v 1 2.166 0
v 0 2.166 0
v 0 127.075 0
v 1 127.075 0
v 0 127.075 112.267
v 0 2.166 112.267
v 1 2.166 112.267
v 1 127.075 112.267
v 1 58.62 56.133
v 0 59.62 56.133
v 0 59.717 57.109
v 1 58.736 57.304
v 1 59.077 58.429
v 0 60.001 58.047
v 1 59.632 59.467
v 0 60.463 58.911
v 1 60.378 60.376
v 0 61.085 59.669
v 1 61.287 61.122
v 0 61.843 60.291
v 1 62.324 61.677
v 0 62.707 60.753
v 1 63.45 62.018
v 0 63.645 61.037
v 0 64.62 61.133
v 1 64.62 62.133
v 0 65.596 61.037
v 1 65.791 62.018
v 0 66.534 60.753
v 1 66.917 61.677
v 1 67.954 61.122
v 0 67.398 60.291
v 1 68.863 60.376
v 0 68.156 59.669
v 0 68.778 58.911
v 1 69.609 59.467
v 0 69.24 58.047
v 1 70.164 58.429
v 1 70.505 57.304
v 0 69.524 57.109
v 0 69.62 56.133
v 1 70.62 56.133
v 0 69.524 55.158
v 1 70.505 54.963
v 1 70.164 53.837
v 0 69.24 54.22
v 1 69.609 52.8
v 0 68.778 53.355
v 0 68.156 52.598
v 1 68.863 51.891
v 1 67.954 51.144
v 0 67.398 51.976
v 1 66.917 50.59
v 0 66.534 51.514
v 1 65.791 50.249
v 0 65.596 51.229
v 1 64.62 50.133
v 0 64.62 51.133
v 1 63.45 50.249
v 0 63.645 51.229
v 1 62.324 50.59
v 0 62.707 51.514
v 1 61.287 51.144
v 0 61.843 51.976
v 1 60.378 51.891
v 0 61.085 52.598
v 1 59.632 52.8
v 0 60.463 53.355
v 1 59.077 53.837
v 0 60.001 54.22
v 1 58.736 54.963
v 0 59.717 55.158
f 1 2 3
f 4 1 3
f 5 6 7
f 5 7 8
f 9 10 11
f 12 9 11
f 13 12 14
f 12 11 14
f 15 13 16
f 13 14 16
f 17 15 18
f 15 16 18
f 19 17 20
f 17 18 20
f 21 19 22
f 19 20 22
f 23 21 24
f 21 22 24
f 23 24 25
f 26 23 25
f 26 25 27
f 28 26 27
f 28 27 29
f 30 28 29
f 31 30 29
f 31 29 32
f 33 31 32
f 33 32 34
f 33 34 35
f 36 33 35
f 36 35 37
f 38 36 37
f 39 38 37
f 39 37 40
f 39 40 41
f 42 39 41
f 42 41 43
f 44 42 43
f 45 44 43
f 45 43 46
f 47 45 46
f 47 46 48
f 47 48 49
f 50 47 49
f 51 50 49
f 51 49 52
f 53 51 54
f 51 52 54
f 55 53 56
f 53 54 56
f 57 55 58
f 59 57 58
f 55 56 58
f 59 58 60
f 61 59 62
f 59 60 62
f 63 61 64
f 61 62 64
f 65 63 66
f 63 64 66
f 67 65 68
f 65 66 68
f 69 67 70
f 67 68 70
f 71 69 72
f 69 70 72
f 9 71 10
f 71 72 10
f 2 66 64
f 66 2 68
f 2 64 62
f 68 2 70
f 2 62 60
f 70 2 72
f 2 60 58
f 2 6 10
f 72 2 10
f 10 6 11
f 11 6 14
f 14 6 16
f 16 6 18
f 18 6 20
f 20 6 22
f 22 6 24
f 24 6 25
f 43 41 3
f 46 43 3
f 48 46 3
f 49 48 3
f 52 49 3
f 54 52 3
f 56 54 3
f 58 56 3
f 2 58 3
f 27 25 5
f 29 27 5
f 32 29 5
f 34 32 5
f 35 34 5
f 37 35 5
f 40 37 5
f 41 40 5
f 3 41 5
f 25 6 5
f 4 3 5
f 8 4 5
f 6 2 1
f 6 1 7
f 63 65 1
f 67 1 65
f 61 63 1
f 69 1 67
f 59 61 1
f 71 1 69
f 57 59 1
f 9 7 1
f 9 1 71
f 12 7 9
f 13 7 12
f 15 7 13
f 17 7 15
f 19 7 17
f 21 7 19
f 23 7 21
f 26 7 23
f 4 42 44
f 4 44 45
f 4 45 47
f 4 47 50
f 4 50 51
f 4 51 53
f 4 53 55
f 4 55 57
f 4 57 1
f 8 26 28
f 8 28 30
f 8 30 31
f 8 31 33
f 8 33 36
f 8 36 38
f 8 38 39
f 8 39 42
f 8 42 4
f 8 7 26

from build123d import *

# Parameters (mm, degrees)
F0_W           = 124.908936
F0_H           = 112.266578
F1_DEPTH       = 1
F3_D           = 6
F3_CSINK_D     = 12
F3_CSINK_ANGLE = 90


with BuildPart() as f1:
    # F0 (on Right) → F1 (new body)
    with BuildSketch(Plane.YZ):
        with Locations((64.620474, 56.133289)):
            Rectangle(F0_W, F0_H)
    extrude(amount=F1_DEPTH)

    # F3 (through all)
    with Locations(Plane.YZ.offset(1)):
        with Locations((64.620474, 56.133289)):
            CounterSinkHole(F3_D / 2, F3_CSINK_D / 2, counter_sink_angle=F3_CSINK_ANGLE)


solid = f1.part
